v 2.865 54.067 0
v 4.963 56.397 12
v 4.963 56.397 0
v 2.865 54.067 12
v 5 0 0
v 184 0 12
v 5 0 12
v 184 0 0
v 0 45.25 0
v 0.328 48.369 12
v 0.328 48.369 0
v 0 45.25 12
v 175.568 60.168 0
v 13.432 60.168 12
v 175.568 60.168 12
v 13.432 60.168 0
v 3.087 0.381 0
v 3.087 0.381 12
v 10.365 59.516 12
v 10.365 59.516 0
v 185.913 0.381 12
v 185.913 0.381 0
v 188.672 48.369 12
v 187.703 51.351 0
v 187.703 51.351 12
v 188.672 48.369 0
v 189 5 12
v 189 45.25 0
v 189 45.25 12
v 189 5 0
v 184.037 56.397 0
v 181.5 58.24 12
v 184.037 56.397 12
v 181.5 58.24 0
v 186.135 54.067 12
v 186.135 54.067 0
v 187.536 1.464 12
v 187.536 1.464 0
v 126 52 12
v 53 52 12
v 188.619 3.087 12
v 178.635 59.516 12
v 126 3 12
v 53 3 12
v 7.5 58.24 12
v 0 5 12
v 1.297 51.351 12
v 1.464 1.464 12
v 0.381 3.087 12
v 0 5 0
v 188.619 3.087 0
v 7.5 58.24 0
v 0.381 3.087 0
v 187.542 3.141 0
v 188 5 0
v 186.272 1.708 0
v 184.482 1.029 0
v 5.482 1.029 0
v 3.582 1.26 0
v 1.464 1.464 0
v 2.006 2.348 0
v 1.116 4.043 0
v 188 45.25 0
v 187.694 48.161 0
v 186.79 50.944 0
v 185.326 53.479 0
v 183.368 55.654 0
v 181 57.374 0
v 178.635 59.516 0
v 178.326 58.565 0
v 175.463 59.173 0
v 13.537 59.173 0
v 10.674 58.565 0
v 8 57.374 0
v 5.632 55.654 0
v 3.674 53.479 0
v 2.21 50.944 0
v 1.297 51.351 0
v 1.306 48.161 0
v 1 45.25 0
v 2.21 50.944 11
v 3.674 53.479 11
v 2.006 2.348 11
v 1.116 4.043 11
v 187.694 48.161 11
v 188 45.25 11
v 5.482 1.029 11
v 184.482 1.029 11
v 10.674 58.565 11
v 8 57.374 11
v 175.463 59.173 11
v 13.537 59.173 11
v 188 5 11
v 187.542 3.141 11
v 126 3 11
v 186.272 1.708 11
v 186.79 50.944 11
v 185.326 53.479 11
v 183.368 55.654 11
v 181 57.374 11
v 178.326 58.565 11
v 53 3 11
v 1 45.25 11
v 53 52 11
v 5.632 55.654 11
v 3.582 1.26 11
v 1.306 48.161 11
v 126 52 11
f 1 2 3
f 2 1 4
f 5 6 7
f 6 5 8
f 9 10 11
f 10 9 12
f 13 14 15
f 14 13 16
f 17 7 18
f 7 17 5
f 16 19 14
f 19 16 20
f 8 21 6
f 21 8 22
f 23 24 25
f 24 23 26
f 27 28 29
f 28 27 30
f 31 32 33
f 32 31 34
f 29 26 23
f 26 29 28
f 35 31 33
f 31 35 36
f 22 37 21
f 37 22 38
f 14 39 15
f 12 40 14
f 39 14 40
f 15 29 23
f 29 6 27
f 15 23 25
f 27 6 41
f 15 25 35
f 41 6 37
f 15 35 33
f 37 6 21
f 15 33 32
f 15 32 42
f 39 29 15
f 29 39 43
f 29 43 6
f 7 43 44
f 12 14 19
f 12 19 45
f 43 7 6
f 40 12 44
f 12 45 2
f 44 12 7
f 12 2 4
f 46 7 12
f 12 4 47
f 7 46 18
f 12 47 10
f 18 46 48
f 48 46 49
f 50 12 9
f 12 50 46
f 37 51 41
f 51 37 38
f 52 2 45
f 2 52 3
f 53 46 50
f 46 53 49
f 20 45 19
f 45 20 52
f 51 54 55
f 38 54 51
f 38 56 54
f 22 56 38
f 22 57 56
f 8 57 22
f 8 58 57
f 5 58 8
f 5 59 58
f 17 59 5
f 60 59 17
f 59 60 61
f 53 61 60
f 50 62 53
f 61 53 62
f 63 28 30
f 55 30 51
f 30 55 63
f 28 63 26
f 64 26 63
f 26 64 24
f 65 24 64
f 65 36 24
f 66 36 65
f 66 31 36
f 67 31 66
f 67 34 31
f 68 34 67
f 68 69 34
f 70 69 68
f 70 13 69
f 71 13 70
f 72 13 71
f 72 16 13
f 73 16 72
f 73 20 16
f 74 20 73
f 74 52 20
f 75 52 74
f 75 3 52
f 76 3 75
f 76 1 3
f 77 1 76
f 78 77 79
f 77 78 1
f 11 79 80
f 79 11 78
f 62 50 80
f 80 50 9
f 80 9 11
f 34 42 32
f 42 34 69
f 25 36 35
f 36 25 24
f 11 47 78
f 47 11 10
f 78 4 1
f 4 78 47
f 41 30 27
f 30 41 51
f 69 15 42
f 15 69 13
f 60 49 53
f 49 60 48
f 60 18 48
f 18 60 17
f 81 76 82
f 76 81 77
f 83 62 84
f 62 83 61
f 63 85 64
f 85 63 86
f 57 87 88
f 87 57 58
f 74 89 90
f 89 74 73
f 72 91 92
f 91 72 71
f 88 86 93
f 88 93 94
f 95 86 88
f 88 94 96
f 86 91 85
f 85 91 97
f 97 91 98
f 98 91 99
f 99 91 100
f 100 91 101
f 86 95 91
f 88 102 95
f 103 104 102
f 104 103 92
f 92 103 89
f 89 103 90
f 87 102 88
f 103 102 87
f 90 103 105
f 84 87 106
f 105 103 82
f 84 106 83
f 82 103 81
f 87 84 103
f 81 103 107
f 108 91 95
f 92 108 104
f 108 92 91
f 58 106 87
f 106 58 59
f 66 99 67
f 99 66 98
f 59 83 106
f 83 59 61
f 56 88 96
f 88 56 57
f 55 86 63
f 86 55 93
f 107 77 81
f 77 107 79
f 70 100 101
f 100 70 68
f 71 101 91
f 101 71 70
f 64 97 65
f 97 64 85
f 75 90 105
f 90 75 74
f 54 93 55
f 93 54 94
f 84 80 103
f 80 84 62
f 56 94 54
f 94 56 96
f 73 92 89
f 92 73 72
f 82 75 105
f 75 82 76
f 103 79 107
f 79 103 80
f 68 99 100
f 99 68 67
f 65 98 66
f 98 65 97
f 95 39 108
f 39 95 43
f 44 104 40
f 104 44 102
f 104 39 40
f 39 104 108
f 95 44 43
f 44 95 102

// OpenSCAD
T = 12;
WLEFT = 53;
WRIGHT = 55;
WDISP = 81; // Total width of the display.
HDISP = 54.6; // Total height of the display.
WSCR = 73; // Width of the display's visible part.
HSCR = 49; // Height of the display's visible part.
H = 60.25;
W = WLEFT + WDISP + WRIGHT;
MDISP = 3;
DPAD = 40;
RPAD = DPAD / 2;
RT = 15;
RB = 5;

module v1_front() {
  difference() {
    outline();
    translate([0, 0, -1])
      outline(shift=1);
    translate([WLEFT, MDISP, 3])
      cube([WSCR, HSCR, 10]);
  }
}

module outline(shift = 0) {
  hull() {
    translate([RT, H - RT, 0])
      cylinder(h=T, r=RT - shift);
    translate([RB, RB, 0])
      cylinder(h=T, r=RB - shift);
    translate([W - RT, H - RT, 0])
      cylinder(h=T, r=RT - shift);
    translate([W - RB, RB, 0])
      cylinder(h=T, r=RB - shift);
  }
}

v1_front();
